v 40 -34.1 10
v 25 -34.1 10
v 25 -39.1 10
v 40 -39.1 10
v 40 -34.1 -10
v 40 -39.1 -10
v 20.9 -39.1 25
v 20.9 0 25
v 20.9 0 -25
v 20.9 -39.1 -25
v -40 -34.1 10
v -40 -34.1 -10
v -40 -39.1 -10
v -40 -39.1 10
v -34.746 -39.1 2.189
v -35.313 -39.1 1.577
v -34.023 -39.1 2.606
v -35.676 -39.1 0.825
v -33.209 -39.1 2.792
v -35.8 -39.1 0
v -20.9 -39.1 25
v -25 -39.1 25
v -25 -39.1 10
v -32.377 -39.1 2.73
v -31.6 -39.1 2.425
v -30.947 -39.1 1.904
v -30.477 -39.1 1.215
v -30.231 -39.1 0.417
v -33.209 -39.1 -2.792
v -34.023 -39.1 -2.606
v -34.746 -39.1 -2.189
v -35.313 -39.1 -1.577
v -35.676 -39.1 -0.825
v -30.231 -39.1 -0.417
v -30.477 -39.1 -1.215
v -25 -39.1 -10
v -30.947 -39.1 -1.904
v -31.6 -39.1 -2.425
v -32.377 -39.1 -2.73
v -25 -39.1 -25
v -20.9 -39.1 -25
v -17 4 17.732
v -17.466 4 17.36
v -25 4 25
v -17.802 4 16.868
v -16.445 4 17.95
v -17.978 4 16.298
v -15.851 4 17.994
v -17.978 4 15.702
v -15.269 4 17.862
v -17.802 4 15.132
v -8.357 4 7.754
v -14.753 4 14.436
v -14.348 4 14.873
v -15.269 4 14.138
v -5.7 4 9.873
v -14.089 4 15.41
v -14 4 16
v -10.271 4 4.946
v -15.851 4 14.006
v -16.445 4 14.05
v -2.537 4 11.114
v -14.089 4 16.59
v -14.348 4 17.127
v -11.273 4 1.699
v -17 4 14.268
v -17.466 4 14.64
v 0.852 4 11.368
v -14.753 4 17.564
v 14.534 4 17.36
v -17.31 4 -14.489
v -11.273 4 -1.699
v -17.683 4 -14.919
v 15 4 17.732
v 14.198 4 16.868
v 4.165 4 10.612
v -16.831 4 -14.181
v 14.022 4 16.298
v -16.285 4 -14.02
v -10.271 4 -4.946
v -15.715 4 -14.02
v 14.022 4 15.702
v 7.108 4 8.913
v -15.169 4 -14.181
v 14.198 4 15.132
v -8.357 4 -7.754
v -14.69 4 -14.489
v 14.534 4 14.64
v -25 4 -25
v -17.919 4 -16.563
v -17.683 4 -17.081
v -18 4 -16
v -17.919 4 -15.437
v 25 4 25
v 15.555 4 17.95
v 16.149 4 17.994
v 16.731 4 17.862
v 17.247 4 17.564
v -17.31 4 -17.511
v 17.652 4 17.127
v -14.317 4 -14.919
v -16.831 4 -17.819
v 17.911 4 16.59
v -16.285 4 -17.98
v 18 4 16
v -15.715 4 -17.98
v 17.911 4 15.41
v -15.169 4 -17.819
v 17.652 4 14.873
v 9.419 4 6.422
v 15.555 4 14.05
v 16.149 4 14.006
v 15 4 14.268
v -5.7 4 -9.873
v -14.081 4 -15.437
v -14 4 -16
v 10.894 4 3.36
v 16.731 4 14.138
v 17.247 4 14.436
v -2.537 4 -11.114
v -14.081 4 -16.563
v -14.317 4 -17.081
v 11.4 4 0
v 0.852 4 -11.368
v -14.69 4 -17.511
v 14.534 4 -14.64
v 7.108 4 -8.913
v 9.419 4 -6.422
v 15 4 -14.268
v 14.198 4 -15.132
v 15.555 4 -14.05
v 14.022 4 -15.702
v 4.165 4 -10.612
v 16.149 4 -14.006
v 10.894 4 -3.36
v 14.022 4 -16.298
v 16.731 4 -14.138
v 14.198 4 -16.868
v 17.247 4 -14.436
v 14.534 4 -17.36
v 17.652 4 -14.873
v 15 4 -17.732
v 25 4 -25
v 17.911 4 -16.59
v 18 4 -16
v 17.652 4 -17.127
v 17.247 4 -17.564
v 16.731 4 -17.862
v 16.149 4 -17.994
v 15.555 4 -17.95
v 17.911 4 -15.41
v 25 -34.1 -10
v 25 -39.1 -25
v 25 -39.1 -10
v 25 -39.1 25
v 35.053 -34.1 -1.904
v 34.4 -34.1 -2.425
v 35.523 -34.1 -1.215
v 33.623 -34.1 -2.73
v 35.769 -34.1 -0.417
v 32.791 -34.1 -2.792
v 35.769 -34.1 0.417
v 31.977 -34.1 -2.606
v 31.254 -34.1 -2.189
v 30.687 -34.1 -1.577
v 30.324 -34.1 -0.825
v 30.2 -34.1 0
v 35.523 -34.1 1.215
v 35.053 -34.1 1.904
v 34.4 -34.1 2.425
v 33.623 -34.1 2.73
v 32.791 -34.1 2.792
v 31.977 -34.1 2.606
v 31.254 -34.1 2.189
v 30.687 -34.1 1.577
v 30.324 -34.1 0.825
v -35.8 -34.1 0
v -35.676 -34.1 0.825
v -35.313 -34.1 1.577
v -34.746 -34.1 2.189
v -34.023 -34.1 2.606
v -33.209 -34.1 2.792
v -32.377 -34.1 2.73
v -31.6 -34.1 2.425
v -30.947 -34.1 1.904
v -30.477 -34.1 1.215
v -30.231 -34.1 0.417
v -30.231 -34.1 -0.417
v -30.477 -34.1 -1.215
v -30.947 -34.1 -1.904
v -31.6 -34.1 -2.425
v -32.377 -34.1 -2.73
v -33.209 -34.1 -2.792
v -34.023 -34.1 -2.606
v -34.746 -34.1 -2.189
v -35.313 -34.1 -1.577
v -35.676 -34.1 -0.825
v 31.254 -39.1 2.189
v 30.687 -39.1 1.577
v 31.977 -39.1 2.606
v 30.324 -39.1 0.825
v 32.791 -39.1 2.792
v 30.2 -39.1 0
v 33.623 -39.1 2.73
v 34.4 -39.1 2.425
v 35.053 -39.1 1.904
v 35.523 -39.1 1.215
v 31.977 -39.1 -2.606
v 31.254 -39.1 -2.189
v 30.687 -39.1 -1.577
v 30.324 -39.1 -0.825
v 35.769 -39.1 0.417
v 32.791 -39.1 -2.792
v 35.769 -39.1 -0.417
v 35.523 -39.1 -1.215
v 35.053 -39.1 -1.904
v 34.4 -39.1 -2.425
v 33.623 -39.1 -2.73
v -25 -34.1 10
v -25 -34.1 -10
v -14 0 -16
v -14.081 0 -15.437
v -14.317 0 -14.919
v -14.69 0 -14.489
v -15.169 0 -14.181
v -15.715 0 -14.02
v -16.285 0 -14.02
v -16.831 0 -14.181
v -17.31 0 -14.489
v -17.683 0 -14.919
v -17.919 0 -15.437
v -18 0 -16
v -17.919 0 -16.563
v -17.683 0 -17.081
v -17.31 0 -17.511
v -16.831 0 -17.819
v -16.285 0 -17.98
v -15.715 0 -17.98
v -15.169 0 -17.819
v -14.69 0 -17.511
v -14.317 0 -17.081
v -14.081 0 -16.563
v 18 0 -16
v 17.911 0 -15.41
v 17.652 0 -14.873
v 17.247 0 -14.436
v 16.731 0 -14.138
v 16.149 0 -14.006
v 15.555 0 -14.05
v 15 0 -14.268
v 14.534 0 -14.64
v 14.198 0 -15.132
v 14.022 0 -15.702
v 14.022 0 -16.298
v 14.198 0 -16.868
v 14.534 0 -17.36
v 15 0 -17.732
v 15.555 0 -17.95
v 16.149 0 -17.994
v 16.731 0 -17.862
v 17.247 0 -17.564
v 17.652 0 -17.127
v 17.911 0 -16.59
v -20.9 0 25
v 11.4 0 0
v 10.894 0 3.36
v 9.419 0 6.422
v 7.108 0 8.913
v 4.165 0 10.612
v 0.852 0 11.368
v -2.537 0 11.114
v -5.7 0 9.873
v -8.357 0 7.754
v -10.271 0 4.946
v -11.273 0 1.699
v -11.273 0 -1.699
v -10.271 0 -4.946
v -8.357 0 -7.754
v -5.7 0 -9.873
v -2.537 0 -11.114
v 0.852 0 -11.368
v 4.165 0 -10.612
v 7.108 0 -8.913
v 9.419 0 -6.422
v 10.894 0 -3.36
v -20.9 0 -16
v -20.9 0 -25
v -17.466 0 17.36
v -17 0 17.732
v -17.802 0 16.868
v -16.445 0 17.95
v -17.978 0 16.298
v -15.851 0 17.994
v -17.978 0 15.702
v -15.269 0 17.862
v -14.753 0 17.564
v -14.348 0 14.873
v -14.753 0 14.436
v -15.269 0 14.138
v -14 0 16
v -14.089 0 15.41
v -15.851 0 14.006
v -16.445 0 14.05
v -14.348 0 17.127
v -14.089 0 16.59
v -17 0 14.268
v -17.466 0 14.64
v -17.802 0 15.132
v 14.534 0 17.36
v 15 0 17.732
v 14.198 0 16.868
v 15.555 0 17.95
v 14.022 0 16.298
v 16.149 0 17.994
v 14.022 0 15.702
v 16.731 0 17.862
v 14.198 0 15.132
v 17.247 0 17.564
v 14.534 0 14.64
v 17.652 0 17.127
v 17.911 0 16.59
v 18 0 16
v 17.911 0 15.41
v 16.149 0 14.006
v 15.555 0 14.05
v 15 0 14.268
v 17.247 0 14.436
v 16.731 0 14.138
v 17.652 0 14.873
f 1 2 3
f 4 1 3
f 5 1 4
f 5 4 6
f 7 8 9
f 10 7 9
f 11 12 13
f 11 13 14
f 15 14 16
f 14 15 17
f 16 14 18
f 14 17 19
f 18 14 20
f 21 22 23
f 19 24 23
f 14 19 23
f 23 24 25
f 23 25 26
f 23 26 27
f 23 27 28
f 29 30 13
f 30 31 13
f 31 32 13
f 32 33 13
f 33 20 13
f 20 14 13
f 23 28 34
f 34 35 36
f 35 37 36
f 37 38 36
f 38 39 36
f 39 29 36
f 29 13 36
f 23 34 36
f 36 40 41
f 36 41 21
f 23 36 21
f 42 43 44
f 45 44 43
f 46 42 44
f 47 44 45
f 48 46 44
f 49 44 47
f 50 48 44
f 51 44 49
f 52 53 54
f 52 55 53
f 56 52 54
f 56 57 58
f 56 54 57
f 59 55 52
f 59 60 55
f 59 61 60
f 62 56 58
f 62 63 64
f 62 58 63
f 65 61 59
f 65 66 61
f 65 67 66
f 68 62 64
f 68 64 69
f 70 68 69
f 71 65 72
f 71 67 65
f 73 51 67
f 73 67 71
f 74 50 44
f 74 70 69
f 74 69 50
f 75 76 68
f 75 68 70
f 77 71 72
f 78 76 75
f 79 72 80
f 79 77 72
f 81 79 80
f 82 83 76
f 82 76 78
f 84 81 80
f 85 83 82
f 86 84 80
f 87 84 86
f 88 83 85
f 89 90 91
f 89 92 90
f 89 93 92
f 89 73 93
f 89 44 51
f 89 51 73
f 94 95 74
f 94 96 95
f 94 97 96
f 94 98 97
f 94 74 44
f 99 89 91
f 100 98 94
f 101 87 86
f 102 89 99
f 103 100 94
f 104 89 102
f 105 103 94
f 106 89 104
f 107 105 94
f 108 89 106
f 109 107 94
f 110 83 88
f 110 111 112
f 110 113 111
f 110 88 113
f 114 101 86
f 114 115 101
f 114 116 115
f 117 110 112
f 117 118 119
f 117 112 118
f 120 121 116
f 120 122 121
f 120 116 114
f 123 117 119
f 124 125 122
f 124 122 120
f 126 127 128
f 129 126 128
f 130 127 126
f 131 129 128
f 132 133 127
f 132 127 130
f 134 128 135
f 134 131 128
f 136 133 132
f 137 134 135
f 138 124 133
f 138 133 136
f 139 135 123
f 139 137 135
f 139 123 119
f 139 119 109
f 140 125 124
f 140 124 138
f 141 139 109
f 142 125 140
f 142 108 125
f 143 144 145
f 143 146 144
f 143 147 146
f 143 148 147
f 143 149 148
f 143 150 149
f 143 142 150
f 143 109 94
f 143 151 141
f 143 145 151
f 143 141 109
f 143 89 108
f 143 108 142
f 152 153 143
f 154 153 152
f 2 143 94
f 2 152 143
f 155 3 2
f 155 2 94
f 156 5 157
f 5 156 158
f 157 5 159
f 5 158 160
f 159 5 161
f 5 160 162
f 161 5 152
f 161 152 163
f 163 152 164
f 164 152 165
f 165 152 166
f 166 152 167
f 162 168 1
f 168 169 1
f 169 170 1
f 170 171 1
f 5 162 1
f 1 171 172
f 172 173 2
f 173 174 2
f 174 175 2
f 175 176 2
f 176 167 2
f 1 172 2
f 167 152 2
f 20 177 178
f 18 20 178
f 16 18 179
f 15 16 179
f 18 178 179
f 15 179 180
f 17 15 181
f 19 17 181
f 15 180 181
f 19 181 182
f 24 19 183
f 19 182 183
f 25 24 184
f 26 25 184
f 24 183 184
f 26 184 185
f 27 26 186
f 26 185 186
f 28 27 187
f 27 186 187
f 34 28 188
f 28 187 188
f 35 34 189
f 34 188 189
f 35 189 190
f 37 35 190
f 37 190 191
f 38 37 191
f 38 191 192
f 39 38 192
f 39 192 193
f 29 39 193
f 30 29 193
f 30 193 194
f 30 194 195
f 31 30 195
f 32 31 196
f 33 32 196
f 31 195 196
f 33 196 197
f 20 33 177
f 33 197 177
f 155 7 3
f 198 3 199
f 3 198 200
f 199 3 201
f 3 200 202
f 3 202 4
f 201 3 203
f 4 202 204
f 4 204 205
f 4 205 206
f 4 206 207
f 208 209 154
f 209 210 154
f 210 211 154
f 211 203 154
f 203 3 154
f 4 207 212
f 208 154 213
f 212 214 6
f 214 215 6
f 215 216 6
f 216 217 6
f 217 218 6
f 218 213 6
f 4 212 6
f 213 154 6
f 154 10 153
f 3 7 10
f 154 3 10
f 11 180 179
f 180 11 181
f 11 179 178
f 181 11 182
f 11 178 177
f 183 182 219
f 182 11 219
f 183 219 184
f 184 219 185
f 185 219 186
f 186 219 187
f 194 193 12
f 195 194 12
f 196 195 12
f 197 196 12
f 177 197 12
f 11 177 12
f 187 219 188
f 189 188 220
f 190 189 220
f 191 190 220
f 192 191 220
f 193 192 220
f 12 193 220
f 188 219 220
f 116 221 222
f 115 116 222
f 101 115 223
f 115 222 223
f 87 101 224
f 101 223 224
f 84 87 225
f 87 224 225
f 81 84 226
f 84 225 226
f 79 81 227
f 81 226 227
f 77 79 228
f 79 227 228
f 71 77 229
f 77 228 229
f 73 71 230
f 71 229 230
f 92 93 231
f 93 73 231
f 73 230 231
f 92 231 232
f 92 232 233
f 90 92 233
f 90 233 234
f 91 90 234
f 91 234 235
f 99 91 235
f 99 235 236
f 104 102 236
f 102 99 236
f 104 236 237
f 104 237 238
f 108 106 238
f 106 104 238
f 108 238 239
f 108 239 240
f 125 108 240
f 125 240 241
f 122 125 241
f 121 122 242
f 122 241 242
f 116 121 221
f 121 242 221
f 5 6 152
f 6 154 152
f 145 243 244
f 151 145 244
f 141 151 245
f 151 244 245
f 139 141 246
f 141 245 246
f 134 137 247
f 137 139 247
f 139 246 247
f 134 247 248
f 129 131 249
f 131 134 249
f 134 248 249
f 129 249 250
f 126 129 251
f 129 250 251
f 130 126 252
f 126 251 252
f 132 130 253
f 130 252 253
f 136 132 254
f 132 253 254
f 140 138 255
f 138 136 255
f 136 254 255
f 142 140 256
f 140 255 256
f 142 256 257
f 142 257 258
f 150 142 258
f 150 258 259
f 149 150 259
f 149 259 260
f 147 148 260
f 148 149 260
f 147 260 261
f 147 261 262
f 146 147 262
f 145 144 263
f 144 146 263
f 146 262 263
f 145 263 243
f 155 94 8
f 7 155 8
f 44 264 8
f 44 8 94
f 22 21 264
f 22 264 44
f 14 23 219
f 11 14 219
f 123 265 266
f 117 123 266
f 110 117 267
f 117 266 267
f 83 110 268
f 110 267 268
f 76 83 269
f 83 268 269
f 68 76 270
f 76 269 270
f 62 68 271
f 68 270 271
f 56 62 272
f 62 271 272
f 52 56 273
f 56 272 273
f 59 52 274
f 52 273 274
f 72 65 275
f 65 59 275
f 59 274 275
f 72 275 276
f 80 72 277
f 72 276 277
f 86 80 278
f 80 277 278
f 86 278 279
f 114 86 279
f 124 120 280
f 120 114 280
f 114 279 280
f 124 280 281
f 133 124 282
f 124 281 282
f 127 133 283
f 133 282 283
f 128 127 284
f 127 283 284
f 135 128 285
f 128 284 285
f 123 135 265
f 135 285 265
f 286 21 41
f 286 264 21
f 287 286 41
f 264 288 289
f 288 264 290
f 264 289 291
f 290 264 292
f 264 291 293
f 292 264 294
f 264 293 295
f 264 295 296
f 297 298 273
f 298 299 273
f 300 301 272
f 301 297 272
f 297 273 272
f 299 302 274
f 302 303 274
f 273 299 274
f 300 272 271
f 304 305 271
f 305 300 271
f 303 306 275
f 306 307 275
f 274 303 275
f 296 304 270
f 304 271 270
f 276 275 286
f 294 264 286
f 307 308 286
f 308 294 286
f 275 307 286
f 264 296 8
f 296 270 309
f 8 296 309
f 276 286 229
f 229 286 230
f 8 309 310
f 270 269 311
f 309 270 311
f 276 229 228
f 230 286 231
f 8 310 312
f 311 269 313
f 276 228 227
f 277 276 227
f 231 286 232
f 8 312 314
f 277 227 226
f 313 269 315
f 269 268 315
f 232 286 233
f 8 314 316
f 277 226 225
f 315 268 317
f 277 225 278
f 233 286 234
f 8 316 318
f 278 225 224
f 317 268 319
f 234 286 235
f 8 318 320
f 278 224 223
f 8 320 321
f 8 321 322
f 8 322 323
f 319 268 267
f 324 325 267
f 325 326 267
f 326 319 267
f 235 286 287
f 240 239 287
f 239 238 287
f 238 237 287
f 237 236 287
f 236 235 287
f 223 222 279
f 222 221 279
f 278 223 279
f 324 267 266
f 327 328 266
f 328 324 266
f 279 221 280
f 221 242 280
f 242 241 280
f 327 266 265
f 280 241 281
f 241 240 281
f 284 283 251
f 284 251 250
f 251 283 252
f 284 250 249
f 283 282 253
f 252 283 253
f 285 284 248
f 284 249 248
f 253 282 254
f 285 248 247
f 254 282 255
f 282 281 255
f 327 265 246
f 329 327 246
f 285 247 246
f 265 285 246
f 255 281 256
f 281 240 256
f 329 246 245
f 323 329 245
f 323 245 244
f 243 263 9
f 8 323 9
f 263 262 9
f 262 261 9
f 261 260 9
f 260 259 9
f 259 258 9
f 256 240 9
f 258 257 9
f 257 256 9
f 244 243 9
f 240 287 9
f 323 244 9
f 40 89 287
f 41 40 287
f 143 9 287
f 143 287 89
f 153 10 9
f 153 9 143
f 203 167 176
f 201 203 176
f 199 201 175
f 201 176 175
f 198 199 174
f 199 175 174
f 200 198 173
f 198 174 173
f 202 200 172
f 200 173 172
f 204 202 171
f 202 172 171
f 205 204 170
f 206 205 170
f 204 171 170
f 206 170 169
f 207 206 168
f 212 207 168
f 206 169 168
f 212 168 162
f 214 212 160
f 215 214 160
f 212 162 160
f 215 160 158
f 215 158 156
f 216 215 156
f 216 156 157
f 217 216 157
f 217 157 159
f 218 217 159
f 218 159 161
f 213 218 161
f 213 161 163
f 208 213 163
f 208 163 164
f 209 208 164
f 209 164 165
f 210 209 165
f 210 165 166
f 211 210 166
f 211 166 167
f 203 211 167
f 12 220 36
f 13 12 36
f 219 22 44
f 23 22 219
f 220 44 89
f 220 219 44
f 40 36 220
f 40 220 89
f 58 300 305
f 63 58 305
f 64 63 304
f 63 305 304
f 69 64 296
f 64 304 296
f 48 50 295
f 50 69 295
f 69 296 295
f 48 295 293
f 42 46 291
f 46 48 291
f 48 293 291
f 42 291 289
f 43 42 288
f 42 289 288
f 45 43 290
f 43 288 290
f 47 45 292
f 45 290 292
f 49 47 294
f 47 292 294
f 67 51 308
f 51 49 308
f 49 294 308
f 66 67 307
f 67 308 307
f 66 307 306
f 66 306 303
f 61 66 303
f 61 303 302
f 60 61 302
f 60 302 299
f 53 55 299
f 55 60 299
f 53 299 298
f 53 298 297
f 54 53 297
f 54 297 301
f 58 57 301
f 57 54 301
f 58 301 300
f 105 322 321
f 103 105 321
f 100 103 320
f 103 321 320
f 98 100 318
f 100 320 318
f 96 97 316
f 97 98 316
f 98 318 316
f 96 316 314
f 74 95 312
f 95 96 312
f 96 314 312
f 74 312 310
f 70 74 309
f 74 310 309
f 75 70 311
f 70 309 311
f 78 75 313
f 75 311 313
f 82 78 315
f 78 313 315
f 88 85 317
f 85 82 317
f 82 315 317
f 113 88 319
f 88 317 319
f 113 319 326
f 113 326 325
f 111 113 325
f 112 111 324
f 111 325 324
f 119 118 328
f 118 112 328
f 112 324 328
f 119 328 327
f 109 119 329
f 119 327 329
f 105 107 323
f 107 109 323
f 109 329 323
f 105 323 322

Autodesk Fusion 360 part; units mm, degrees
sketch "Sketch1" plane through (0, 0, 0) normal (0, 1, 0) x (1, 0, 0)
  line L0 (-20.9, 20.9) -> (20.9, 20.9)
  line L1 (20.9, 20.9) -> (20.9, -20.9)
  line L2 (20.9, -20.9) -> (-20.9, -20.9)
  line L3 (-20.9, -20.9) -> (-20.9, 20.9)
  line L4 (-20.9, 20.9) -> (20.9, -20.9) construction
  line L5 (20.9, 20.9) -> (-20.9, -20.9) construction
  line L6 (-20.9, 20.9) -> (-20.9, 16)
  line L7 (-20.9, 16) -> (-16, 16)
  circle A0 centre (-16, 16) radius 2
  circle A1 centre (-16, -16) radius 2
  circle A2 centre (16, -16) radius 2
  circle A3 centre (16, 16) radius 2
  line L8 (-25, 25) -> (25, 25)
  line L9 (25, 25) -> (25, -25)
  line L10 (25, -25) -> (-25, -25)
  line L11 (-25, -25) -> (-25, 25)
  line L12 (-25, 25) -> (25, -25) construction
  line L13 (25, 25) -> (-25, -25) construction
  line L14 (-20.9, 25) -> (-20.9, -25)
  line L15 (20.9, -25) -> (20.9, 25)
  circle A4 centre (0, 0) radius 11.4
  dimension "d1" = 41.8
  dimension "d2" = 41.8
  dimension "d3" = 4.9
  dimension "d4" = 4.9
  dimension "d5" = 4
  dimension "d7" = 360
  dimension "d8" = 50
  dimension "d9" = 50
  dimension "d10" = 22.8
extrude "Extrude1" add sketch "Sketch1" along normal blind 4
extrude "Extrude2" add sketch "Sketch1" against normal blind 39.1 contours L3 L6 L8 L10 L11 L14 | L1 L8 L9 L10 L15
sketch "Sketch2" plane through (-25, 0, 0) normal (-1, 0, 0) x (0, 0, 1)
  line L0 (25, -39.1) -> (25, 4)
  line L1 (25, 4) -> (-25, 4)
  line L2 (-25, 4) -> (-25, -39.1)
  line L3 (-25, -39.1) -> (25, -39.1)
  line L4 (0, -39.1) -> (-10, -39.1)
  line L5 (-10, -39.1) -> (10, -39.1)
  line L6 (10, -39.1) -> (10, -34.1)
  line L7 (10, -34.1) -> (-10, -34.1)
  line L8 (-10, -34.1) -> (-10, -39.1)
  dimension "d15" = 10
  dimension "d16" = 20
  dimension "d17" = 5
sketch "Sketch3" plane through (25, 0, 0) normal (1, 0, 0) x (0, 0, -1)
  line L0 (25, -39.1) -> (25, 4)
  line L1 (25, 4) -> (-25, 4)
  line L2 (-25, 4) -> (-25, -39.1)
  line L3 (-25, -39.1) -> (25, -39.1)
  line L4 (0, -39.1) -> (-10, -39.1)
  line L5 (-10, -39.1) -> (10, -39.1)
  line L6 (10, -39.1) -> (10, -34.1)
  line L7 (10, -34.1) -> (-10, -34.1)
  line L8 (-10, -34.1) -> (-10, -39.1)
  dimension "d18" = 20
  dimension "d19" = 5
extrude "Extrude3" add sketch "Sketch3" along normal blind 15 contours L3 L4 L5 L6 L7 L8
extrude "Extrude4" add sketch "Sketch2" along normal blind 15 contours L3 L4 L5 L6 L7 L8
sketch "Sketch4" plane through (0, -34.1, 0) normal (0, 1, 0) x (-1, 0, 0)
  line L0 (25, 10) -> (25, -10)
  line L1 (25, -10) -> (40, -10)
  line L2 (40, -10) -> (40, 10)
  line L3 (40, 10) -> (25, 10)
  line L4 (40, 0) -> (33, 0)
  circle A0 centre (33, 0) radius 2.8
  dimension "d24" = 7
  dimension "d25" = 5.6
sketch "Sketch5" plane through (0, -34.1, 0) normal (0, 1, 0) x (-1, 0, 0)
  line L0 (-25, -10) -> (-25, 10)
  line L1 (-25, 10) -> (-40, 10)
  line L2 (-40, 10) -> (-40, -10)
  line L3 (-40, -10) -> (-25, -10)
  line L4 (-40, 0) -> (-33, 0)
  circle A0 centre (-33, 0) radius 2.8
  dimension "d26" = 7
  dimension "d27" = 5.6
extrude "Extrude5" cut sketch "Sketch4" sketch "Sketch5" against normal blind 30 contours A0 of sketch 2 contours A0
